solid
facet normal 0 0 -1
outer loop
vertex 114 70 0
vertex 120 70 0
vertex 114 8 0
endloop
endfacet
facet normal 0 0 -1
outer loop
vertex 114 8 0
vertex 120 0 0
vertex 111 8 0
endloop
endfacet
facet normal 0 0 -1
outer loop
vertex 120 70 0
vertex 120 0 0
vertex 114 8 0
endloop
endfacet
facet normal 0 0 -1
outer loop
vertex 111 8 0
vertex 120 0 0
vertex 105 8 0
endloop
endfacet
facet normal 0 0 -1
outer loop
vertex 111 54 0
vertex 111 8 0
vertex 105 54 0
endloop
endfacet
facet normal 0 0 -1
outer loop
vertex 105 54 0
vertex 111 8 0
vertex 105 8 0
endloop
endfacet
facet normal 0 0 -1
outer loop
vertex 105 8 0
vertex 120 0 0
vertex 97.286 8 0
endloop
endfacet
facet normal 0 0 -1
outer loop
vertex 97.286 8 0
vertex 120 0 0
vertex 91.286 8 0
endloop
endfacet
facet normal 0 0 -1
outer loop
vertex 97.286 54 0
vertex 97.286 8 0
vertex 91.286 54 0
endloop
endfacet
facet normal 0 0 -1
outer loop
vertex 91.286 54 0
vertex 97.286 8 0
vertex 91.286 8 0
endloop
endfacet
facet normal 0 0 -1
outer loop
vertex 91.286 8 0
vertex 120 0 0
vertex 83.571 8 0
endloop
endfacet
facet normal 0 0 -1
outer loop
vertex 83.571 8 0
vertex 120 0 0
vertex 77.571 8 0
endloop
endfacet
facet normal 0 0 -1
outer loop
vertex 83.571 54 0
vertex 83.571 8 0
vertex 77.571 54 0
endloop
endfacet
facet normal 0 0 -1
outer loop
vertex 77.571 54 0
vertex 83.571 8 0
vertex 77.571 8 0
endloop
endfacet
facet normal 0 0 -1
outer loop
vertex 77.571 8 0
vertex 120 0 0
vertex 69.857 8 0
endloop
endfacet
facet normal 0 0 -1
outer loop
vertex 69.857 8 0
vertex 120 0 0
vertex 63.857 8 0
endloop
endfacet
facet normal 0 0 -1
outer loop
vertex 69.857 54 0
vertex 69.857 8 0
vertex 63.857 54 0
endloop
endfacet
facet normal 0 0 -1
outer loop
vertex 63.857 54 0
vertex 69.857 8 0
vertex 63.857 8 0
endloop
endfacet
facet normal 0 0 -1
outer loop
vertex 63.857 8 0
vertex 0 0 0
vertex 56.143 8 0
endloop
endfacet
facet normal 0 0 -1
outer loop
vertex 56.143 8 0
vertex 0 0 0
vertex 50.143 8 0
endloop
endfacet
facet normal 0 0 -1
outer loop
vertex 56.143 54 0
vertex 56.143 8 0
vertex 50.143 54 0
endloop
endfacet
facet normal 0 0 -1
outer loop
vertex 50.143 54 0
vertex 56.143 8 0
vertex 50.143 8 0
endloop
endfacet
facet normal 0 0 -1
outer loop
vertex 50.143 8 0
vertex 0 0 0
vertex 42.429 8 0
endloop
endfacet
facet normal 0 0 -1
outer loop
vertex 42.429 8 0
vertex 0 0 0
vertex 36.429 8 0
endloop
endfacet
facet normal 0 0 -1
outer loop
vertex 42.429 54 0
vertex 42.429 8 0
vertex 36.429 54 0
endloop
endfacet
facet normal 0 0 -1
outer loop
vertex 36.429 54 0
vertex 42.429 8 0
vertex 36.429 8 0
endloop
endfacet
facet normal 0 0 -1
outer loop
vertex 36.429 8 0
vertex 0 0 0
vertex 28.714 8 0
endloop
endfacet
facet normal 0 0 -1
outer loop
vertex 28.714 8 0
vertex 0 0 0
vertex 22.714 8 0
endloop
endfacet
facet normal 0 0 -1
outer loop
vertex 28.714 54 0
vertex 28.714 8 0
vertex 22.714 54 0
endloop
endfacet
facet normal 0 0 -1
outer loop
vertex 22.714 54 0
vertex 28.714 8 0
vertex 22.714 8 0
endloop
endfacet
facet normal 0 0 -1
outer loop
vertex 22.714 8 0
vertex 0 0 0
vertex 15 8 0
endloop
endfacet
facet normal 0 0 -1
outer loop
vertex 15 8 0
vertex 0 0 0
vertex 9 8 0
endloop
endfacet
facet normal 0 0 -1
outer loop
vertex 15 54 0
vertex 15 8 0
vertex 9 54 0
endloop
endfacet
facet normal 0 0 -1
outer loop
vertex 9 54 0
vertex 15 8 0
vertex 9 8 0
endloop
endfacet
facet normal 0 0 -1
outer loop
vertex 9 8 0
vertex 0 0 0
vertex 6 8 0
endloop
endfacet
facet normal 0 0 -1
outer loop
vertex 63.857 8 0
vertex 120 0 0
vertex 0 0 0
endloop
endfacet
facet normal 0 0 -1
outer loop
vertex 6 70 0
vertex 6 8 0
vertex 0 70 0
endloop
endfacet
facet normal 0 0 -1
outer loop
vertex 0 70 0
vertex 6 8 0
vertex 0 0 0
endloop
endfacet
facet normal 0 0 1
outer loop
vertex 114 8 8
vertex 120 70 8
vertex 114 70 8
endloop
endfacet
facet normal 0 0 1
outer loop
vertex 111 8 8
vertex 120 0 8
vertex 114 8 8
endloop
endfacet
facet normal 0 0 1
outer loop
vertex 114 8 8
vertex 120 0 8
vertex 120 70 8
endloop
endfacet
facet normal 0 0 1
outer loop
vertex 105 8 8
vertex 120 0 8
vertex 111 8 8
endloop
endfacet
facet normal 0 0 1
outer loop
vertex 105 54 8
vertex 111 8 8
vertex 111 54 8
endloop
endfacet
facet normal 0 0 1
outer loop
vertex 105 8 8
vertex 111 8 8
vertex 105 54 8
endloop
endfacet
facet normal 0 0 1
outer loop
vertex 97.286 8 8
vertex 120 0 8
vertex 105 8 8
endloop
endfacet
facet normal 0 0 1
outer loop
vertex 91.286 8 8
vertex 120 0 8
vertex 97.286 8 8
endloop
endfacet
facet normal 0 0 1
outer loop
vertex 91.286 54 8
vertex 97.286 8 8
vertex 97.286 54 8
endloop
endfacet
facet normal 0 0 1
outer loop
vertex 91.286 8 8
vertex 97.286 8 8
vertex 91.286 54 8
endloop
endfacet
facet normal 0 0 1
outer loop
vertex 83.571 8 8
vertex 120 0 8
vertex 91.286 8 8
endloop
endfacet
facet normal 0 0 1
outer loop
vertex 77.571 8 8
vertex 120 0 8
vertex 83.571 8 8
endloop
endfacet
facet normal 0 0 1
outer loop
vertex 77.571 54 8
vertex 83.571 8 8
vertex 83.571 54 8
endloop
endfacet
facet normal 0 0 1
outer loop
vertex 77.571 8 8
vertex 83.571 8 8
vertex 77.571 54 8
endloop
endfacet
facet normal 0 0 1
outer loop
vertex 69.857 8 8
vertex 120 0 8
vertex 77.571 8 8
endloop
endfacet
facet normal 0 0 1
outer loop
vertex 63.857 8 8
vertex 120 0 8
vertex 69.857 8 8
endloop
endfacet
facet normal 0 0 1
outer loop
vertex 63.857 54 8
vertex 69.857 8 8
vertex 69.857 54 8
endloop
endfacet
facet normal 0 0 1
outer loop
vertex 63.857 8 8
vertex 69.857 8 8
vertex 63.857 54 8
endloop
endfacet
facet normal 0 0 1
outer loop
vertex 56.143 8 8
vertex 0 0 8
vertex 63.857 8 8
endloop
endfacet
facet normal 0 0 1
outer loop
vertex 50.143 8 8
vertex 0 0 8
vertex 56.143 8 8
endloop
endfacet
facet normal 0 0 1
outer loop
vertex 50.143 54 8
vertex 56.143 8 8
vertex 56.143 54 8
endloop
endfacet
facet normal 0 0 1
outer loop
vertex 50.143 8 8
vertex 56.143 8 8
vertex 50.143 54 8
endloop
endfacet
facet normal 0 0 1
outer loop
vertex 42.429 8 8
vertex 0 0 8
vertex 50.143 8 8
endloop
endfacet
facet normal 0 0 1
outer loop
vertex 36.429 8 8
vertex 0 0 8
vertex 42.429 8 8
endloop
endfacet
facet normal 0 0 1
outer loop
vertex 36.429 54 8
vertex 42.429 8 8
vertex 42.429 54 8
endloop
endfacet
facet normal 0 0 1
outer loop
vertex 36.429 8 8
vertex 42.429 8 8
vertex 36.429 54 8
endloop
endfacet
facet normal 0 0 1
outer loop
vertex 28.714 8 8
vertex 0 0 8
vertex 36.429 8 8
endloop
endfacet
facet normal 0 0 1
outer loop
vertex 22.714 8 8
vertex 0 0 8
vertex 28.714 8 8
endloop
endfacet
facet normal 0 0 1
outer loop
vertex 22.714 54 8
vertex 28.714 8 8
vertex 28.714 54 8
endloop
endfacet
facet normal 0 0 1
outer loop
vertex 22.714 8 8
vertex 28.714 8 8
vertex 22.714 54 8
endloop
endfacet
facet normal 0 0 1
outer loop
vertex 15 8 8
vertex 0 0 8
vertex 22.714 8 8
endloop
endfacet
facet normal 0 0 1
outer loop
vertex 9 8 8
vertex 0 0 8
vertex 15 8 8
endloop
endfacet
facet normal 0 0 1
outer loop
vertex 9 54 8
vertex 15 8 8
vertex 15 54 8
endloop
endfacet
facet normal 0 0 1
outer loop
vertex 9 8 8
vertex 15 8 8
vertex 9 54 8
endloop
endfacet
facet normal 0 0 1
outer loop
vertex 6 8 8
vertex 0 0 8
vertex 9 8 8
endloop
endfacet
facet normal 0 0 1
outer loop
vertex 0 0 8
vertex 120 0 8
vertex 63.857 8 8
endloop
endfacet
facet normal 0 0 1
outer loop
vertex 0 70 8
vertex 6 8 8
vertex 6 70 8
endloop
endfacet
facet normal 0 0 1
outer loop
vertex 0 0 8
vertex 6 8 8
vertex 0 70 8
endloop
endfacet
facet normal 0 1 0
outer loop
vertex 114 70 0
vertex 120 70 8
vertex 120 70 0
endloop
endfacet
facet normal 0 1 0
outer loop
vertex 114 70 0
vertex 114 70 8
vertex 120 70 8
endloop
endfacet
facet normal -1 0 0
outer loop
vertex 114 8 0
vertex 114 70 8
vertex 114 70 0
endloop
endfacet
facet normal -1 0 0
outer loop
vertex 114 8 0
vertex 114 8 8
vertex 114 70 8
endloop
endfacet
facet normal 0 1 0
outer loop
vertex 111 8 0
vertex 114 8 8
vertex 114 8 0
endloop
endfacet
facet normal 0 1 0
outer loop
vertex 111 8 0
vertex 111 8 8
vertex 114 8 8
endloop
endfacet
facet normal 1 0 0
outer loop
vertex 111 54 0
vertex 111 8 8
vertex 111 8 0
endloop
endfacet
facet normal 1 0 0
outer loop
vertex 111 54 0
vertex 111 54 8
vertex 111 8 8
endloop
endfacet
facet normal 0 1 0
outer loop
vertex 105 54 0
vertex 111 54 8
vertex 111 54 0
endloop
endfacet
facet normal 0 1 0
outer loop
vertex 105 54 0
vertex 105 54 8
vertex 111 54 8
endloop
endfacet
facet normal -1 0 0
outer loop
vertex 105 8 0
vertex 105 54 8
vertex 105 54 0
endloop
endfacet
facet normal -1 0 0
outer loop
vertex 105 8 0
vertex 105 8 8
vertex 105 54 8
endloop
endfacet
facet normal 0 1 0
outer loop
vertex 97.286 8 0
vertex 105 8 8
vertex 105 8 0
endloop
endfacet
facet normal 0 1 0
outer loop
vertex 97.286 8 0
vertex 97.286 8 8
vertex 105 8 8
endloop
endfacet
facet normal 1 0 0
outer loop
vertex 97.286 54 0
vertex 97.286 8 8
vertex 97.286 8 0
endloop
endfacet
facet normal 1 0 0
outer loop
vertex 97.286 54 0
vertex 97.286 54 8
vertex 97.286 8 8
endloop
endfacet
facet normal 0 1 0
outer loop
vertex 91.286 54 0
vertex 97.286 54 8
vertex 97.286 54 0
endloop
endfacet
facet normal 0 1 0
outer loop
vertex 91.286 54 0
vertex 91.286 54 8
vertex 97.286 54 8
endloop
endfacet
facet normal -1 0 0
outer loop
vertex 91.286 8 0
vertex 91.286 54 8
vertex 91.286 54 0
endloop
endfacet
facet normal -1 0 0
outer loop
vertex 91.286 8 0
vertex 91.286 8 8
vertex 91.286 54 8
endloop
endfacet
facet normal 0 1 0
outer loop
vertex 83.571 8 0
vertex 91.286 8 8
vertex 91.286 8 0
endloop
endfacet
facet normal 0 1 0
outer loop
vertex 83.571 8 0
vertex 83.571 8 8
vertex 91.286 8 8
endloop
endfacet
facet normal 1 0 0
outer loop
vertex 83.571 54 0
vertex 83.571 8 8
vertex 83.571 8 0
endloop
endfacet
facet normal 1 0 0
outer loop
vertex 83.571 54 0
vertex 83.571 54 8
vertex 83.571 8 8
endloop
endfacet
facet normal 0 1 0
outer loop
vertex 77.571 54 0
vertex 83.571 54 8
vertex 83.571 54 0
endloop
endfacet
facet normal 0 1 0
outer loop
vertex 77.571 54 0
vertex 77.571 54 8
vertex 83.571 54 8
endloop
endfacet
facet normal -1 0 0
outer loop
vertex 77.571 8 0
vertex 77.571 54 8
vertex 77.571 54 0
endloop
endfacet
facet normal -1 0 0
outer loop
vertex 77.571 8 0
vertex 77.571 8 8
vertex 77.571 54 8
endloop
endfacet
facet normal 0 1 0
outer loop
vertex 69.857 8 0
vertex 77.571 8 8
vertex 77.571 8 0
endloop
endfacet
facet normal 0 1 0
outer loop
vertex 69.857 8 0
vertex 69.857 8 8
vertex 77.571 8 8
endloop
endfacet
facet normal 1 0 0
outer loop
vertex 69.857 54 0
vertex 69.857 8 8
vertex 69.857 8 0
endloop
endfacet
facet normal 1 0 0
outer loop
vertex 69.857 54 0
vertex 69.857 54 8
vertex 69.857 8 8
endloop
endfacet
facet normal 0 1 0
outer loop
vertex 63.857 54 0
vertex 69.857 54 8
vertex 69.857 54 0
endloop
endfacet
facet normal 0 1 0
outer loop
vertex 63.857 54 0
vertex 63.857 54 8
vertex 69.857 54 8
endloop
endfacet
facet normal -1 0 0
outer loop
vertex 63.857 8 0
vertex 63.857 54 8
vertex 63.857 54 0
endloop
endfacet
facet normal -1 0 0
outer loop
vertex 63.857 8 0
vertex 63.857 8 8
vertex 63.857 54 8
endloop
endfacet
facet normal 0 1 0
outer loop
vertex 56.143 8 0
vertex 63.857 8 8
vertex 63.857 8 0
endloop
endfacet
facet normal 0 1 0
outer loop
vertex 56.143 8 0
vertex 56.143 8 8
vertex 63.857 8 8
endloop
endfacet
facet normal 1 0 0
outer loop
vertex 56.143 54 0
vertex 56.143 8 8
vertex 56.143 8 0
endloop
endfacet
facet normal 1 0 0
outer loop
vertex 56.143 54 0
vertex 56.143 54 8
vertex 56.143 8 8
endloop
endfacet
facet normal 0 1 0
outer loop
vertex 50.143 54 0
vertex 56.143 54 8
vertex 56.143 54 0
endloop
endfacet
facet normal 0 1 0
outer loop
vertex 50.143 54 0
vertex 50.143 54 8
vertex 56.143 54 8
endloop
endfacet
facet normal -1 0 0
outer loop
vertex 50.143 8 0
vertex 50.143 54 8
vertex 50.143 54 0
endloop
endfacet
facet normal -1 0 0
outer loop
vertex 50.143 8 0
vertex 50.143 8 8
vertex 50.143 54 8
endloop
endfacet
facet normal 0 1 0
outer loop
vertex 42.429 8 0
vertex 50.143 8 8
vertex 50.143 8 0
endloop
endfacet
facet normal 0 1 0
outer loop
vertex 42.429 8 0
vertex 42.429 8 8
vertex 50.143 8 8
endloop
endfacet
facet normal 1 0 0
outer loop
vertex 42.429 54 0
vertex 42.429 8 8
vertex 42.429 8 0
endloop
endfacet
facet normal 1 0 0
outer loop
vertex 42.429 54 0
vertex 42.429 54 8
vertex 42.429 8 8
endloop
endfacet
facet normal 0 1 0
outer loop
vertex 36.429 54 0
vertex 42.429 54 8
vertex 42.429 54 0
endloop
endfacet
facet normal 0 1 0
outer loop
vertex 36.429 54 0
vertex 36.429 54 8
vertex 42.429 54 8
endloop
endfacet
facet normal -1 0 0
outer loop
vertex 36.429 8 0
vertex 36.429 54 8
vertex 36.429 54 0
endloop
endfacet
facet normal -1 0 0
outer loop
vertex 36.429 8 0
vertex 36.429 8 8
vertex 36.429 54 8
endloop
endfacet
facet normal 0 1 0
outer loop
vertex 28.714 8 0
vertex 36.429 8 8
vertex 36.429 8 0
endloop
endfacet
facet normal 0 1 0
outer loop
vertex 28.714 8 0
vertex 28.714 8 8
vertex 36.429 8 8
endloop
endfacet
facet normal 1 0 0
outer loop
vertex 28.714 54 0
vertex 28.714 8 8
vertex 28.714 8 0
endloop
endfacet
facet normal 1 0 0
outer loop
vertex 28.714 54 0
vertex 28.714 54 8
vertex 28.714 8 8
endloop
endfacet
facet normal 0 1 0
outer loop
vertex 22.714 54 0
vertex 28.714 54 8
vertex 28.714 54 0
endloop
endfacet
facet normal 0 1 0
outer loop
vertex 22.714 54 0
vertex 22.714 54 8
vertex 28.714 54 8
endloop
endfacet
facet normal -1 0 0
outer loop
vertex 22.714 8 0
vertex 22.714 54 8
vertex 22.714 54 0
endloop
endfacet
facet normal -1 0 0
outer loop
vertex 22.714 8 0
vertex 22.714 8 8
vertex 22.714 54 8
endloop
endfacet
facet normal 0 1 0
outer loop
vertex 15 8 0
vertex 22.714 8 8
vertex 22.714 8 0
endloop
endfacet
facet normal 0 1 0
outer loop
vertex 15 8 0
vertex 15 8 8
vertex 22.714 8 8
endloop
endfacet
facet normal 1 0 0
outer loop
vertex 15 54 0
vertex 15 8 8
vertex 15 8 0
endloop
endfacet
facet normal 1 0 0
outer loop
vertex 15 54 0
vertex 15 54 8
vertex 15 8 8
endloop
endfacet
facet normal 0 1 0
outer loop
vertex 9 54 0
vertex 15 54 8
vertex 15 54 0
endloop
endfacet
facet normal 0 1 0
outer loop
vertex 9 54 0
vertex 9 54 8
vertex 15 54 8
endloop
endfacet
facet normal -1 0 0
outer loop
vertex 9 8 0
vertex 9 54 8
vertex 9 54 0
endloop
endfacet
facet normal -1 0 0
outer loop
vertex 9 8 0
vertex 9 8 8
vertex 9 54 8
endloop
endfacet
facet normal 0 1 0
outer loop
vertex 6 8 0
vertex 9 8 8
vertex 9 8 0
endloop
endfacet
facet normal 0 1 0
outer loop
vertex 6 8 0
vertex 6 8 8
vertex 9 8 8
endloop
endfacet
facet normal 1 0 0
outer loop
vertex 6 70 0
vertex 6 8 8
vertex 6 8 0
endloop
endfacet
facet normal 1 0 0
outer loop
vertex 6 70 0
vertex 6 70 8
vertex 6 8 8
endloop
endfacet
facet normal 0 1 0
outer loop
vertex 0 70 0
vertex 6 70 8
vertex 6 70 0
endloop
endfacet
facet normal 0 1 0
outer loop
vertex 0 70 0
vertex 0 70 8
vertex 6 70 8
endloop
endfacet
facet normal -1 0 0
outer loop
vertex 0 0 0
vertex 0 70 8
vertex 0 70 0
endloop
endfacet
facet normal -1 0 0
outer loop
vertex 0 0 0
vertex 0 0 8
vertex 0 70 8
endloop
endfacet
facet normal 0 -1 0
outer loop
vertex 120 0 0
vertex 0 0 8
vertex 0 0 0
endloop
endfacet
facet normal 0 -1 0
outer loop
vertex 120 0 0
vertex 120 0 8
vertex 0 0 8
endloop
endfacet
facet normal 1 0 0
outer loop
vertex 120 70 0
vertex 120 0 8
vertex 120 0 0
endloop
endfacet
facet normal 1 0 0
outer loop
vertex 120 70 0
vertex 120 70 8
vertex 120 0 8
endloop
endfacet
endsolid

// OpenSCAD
$fn = 32;

// ----------------------------------------------------------------------
// Guard grille: 8 slats over a 120 x 70 mm plate
// ----------------------------------------------------------------------

// --- parameters (mm) ---
profile_height = 8;       // extrusion height
profile_points = 40;      // points of the closed outline

profile = [[0, 0], [120, 0], [120, 70], [114, 70], [114, 8], [111, 8], [111, 54], [105, 54], [105, 8], [97.286, 8], [97.286, 54], [91.286, 54], [91.286, 8], [83.571, 8], [83.571, 54], [77.571, 54], [77.571, 8], [69.857, 8], [69.857, 54], [63.857, 54], [63.857, 8], [56.143, 8], [56.143, 54], [50.143, 54], [50.143, 8], [42.429, 8], [42.429, 54], [36.429, 54], [36.429, 8], [28.714, 8], [28.714, 54], [22.714, 54], [22.714, 8], [15, 8], [15, 54], [9, 54], [9, 8], [6, 8], [6, 70], [0, 70]];  // single closed polygon, 40 points, counter clockwise

// --- the one profile operation ---
linear_extrude(height = profile_height) polygon(points = profile);
